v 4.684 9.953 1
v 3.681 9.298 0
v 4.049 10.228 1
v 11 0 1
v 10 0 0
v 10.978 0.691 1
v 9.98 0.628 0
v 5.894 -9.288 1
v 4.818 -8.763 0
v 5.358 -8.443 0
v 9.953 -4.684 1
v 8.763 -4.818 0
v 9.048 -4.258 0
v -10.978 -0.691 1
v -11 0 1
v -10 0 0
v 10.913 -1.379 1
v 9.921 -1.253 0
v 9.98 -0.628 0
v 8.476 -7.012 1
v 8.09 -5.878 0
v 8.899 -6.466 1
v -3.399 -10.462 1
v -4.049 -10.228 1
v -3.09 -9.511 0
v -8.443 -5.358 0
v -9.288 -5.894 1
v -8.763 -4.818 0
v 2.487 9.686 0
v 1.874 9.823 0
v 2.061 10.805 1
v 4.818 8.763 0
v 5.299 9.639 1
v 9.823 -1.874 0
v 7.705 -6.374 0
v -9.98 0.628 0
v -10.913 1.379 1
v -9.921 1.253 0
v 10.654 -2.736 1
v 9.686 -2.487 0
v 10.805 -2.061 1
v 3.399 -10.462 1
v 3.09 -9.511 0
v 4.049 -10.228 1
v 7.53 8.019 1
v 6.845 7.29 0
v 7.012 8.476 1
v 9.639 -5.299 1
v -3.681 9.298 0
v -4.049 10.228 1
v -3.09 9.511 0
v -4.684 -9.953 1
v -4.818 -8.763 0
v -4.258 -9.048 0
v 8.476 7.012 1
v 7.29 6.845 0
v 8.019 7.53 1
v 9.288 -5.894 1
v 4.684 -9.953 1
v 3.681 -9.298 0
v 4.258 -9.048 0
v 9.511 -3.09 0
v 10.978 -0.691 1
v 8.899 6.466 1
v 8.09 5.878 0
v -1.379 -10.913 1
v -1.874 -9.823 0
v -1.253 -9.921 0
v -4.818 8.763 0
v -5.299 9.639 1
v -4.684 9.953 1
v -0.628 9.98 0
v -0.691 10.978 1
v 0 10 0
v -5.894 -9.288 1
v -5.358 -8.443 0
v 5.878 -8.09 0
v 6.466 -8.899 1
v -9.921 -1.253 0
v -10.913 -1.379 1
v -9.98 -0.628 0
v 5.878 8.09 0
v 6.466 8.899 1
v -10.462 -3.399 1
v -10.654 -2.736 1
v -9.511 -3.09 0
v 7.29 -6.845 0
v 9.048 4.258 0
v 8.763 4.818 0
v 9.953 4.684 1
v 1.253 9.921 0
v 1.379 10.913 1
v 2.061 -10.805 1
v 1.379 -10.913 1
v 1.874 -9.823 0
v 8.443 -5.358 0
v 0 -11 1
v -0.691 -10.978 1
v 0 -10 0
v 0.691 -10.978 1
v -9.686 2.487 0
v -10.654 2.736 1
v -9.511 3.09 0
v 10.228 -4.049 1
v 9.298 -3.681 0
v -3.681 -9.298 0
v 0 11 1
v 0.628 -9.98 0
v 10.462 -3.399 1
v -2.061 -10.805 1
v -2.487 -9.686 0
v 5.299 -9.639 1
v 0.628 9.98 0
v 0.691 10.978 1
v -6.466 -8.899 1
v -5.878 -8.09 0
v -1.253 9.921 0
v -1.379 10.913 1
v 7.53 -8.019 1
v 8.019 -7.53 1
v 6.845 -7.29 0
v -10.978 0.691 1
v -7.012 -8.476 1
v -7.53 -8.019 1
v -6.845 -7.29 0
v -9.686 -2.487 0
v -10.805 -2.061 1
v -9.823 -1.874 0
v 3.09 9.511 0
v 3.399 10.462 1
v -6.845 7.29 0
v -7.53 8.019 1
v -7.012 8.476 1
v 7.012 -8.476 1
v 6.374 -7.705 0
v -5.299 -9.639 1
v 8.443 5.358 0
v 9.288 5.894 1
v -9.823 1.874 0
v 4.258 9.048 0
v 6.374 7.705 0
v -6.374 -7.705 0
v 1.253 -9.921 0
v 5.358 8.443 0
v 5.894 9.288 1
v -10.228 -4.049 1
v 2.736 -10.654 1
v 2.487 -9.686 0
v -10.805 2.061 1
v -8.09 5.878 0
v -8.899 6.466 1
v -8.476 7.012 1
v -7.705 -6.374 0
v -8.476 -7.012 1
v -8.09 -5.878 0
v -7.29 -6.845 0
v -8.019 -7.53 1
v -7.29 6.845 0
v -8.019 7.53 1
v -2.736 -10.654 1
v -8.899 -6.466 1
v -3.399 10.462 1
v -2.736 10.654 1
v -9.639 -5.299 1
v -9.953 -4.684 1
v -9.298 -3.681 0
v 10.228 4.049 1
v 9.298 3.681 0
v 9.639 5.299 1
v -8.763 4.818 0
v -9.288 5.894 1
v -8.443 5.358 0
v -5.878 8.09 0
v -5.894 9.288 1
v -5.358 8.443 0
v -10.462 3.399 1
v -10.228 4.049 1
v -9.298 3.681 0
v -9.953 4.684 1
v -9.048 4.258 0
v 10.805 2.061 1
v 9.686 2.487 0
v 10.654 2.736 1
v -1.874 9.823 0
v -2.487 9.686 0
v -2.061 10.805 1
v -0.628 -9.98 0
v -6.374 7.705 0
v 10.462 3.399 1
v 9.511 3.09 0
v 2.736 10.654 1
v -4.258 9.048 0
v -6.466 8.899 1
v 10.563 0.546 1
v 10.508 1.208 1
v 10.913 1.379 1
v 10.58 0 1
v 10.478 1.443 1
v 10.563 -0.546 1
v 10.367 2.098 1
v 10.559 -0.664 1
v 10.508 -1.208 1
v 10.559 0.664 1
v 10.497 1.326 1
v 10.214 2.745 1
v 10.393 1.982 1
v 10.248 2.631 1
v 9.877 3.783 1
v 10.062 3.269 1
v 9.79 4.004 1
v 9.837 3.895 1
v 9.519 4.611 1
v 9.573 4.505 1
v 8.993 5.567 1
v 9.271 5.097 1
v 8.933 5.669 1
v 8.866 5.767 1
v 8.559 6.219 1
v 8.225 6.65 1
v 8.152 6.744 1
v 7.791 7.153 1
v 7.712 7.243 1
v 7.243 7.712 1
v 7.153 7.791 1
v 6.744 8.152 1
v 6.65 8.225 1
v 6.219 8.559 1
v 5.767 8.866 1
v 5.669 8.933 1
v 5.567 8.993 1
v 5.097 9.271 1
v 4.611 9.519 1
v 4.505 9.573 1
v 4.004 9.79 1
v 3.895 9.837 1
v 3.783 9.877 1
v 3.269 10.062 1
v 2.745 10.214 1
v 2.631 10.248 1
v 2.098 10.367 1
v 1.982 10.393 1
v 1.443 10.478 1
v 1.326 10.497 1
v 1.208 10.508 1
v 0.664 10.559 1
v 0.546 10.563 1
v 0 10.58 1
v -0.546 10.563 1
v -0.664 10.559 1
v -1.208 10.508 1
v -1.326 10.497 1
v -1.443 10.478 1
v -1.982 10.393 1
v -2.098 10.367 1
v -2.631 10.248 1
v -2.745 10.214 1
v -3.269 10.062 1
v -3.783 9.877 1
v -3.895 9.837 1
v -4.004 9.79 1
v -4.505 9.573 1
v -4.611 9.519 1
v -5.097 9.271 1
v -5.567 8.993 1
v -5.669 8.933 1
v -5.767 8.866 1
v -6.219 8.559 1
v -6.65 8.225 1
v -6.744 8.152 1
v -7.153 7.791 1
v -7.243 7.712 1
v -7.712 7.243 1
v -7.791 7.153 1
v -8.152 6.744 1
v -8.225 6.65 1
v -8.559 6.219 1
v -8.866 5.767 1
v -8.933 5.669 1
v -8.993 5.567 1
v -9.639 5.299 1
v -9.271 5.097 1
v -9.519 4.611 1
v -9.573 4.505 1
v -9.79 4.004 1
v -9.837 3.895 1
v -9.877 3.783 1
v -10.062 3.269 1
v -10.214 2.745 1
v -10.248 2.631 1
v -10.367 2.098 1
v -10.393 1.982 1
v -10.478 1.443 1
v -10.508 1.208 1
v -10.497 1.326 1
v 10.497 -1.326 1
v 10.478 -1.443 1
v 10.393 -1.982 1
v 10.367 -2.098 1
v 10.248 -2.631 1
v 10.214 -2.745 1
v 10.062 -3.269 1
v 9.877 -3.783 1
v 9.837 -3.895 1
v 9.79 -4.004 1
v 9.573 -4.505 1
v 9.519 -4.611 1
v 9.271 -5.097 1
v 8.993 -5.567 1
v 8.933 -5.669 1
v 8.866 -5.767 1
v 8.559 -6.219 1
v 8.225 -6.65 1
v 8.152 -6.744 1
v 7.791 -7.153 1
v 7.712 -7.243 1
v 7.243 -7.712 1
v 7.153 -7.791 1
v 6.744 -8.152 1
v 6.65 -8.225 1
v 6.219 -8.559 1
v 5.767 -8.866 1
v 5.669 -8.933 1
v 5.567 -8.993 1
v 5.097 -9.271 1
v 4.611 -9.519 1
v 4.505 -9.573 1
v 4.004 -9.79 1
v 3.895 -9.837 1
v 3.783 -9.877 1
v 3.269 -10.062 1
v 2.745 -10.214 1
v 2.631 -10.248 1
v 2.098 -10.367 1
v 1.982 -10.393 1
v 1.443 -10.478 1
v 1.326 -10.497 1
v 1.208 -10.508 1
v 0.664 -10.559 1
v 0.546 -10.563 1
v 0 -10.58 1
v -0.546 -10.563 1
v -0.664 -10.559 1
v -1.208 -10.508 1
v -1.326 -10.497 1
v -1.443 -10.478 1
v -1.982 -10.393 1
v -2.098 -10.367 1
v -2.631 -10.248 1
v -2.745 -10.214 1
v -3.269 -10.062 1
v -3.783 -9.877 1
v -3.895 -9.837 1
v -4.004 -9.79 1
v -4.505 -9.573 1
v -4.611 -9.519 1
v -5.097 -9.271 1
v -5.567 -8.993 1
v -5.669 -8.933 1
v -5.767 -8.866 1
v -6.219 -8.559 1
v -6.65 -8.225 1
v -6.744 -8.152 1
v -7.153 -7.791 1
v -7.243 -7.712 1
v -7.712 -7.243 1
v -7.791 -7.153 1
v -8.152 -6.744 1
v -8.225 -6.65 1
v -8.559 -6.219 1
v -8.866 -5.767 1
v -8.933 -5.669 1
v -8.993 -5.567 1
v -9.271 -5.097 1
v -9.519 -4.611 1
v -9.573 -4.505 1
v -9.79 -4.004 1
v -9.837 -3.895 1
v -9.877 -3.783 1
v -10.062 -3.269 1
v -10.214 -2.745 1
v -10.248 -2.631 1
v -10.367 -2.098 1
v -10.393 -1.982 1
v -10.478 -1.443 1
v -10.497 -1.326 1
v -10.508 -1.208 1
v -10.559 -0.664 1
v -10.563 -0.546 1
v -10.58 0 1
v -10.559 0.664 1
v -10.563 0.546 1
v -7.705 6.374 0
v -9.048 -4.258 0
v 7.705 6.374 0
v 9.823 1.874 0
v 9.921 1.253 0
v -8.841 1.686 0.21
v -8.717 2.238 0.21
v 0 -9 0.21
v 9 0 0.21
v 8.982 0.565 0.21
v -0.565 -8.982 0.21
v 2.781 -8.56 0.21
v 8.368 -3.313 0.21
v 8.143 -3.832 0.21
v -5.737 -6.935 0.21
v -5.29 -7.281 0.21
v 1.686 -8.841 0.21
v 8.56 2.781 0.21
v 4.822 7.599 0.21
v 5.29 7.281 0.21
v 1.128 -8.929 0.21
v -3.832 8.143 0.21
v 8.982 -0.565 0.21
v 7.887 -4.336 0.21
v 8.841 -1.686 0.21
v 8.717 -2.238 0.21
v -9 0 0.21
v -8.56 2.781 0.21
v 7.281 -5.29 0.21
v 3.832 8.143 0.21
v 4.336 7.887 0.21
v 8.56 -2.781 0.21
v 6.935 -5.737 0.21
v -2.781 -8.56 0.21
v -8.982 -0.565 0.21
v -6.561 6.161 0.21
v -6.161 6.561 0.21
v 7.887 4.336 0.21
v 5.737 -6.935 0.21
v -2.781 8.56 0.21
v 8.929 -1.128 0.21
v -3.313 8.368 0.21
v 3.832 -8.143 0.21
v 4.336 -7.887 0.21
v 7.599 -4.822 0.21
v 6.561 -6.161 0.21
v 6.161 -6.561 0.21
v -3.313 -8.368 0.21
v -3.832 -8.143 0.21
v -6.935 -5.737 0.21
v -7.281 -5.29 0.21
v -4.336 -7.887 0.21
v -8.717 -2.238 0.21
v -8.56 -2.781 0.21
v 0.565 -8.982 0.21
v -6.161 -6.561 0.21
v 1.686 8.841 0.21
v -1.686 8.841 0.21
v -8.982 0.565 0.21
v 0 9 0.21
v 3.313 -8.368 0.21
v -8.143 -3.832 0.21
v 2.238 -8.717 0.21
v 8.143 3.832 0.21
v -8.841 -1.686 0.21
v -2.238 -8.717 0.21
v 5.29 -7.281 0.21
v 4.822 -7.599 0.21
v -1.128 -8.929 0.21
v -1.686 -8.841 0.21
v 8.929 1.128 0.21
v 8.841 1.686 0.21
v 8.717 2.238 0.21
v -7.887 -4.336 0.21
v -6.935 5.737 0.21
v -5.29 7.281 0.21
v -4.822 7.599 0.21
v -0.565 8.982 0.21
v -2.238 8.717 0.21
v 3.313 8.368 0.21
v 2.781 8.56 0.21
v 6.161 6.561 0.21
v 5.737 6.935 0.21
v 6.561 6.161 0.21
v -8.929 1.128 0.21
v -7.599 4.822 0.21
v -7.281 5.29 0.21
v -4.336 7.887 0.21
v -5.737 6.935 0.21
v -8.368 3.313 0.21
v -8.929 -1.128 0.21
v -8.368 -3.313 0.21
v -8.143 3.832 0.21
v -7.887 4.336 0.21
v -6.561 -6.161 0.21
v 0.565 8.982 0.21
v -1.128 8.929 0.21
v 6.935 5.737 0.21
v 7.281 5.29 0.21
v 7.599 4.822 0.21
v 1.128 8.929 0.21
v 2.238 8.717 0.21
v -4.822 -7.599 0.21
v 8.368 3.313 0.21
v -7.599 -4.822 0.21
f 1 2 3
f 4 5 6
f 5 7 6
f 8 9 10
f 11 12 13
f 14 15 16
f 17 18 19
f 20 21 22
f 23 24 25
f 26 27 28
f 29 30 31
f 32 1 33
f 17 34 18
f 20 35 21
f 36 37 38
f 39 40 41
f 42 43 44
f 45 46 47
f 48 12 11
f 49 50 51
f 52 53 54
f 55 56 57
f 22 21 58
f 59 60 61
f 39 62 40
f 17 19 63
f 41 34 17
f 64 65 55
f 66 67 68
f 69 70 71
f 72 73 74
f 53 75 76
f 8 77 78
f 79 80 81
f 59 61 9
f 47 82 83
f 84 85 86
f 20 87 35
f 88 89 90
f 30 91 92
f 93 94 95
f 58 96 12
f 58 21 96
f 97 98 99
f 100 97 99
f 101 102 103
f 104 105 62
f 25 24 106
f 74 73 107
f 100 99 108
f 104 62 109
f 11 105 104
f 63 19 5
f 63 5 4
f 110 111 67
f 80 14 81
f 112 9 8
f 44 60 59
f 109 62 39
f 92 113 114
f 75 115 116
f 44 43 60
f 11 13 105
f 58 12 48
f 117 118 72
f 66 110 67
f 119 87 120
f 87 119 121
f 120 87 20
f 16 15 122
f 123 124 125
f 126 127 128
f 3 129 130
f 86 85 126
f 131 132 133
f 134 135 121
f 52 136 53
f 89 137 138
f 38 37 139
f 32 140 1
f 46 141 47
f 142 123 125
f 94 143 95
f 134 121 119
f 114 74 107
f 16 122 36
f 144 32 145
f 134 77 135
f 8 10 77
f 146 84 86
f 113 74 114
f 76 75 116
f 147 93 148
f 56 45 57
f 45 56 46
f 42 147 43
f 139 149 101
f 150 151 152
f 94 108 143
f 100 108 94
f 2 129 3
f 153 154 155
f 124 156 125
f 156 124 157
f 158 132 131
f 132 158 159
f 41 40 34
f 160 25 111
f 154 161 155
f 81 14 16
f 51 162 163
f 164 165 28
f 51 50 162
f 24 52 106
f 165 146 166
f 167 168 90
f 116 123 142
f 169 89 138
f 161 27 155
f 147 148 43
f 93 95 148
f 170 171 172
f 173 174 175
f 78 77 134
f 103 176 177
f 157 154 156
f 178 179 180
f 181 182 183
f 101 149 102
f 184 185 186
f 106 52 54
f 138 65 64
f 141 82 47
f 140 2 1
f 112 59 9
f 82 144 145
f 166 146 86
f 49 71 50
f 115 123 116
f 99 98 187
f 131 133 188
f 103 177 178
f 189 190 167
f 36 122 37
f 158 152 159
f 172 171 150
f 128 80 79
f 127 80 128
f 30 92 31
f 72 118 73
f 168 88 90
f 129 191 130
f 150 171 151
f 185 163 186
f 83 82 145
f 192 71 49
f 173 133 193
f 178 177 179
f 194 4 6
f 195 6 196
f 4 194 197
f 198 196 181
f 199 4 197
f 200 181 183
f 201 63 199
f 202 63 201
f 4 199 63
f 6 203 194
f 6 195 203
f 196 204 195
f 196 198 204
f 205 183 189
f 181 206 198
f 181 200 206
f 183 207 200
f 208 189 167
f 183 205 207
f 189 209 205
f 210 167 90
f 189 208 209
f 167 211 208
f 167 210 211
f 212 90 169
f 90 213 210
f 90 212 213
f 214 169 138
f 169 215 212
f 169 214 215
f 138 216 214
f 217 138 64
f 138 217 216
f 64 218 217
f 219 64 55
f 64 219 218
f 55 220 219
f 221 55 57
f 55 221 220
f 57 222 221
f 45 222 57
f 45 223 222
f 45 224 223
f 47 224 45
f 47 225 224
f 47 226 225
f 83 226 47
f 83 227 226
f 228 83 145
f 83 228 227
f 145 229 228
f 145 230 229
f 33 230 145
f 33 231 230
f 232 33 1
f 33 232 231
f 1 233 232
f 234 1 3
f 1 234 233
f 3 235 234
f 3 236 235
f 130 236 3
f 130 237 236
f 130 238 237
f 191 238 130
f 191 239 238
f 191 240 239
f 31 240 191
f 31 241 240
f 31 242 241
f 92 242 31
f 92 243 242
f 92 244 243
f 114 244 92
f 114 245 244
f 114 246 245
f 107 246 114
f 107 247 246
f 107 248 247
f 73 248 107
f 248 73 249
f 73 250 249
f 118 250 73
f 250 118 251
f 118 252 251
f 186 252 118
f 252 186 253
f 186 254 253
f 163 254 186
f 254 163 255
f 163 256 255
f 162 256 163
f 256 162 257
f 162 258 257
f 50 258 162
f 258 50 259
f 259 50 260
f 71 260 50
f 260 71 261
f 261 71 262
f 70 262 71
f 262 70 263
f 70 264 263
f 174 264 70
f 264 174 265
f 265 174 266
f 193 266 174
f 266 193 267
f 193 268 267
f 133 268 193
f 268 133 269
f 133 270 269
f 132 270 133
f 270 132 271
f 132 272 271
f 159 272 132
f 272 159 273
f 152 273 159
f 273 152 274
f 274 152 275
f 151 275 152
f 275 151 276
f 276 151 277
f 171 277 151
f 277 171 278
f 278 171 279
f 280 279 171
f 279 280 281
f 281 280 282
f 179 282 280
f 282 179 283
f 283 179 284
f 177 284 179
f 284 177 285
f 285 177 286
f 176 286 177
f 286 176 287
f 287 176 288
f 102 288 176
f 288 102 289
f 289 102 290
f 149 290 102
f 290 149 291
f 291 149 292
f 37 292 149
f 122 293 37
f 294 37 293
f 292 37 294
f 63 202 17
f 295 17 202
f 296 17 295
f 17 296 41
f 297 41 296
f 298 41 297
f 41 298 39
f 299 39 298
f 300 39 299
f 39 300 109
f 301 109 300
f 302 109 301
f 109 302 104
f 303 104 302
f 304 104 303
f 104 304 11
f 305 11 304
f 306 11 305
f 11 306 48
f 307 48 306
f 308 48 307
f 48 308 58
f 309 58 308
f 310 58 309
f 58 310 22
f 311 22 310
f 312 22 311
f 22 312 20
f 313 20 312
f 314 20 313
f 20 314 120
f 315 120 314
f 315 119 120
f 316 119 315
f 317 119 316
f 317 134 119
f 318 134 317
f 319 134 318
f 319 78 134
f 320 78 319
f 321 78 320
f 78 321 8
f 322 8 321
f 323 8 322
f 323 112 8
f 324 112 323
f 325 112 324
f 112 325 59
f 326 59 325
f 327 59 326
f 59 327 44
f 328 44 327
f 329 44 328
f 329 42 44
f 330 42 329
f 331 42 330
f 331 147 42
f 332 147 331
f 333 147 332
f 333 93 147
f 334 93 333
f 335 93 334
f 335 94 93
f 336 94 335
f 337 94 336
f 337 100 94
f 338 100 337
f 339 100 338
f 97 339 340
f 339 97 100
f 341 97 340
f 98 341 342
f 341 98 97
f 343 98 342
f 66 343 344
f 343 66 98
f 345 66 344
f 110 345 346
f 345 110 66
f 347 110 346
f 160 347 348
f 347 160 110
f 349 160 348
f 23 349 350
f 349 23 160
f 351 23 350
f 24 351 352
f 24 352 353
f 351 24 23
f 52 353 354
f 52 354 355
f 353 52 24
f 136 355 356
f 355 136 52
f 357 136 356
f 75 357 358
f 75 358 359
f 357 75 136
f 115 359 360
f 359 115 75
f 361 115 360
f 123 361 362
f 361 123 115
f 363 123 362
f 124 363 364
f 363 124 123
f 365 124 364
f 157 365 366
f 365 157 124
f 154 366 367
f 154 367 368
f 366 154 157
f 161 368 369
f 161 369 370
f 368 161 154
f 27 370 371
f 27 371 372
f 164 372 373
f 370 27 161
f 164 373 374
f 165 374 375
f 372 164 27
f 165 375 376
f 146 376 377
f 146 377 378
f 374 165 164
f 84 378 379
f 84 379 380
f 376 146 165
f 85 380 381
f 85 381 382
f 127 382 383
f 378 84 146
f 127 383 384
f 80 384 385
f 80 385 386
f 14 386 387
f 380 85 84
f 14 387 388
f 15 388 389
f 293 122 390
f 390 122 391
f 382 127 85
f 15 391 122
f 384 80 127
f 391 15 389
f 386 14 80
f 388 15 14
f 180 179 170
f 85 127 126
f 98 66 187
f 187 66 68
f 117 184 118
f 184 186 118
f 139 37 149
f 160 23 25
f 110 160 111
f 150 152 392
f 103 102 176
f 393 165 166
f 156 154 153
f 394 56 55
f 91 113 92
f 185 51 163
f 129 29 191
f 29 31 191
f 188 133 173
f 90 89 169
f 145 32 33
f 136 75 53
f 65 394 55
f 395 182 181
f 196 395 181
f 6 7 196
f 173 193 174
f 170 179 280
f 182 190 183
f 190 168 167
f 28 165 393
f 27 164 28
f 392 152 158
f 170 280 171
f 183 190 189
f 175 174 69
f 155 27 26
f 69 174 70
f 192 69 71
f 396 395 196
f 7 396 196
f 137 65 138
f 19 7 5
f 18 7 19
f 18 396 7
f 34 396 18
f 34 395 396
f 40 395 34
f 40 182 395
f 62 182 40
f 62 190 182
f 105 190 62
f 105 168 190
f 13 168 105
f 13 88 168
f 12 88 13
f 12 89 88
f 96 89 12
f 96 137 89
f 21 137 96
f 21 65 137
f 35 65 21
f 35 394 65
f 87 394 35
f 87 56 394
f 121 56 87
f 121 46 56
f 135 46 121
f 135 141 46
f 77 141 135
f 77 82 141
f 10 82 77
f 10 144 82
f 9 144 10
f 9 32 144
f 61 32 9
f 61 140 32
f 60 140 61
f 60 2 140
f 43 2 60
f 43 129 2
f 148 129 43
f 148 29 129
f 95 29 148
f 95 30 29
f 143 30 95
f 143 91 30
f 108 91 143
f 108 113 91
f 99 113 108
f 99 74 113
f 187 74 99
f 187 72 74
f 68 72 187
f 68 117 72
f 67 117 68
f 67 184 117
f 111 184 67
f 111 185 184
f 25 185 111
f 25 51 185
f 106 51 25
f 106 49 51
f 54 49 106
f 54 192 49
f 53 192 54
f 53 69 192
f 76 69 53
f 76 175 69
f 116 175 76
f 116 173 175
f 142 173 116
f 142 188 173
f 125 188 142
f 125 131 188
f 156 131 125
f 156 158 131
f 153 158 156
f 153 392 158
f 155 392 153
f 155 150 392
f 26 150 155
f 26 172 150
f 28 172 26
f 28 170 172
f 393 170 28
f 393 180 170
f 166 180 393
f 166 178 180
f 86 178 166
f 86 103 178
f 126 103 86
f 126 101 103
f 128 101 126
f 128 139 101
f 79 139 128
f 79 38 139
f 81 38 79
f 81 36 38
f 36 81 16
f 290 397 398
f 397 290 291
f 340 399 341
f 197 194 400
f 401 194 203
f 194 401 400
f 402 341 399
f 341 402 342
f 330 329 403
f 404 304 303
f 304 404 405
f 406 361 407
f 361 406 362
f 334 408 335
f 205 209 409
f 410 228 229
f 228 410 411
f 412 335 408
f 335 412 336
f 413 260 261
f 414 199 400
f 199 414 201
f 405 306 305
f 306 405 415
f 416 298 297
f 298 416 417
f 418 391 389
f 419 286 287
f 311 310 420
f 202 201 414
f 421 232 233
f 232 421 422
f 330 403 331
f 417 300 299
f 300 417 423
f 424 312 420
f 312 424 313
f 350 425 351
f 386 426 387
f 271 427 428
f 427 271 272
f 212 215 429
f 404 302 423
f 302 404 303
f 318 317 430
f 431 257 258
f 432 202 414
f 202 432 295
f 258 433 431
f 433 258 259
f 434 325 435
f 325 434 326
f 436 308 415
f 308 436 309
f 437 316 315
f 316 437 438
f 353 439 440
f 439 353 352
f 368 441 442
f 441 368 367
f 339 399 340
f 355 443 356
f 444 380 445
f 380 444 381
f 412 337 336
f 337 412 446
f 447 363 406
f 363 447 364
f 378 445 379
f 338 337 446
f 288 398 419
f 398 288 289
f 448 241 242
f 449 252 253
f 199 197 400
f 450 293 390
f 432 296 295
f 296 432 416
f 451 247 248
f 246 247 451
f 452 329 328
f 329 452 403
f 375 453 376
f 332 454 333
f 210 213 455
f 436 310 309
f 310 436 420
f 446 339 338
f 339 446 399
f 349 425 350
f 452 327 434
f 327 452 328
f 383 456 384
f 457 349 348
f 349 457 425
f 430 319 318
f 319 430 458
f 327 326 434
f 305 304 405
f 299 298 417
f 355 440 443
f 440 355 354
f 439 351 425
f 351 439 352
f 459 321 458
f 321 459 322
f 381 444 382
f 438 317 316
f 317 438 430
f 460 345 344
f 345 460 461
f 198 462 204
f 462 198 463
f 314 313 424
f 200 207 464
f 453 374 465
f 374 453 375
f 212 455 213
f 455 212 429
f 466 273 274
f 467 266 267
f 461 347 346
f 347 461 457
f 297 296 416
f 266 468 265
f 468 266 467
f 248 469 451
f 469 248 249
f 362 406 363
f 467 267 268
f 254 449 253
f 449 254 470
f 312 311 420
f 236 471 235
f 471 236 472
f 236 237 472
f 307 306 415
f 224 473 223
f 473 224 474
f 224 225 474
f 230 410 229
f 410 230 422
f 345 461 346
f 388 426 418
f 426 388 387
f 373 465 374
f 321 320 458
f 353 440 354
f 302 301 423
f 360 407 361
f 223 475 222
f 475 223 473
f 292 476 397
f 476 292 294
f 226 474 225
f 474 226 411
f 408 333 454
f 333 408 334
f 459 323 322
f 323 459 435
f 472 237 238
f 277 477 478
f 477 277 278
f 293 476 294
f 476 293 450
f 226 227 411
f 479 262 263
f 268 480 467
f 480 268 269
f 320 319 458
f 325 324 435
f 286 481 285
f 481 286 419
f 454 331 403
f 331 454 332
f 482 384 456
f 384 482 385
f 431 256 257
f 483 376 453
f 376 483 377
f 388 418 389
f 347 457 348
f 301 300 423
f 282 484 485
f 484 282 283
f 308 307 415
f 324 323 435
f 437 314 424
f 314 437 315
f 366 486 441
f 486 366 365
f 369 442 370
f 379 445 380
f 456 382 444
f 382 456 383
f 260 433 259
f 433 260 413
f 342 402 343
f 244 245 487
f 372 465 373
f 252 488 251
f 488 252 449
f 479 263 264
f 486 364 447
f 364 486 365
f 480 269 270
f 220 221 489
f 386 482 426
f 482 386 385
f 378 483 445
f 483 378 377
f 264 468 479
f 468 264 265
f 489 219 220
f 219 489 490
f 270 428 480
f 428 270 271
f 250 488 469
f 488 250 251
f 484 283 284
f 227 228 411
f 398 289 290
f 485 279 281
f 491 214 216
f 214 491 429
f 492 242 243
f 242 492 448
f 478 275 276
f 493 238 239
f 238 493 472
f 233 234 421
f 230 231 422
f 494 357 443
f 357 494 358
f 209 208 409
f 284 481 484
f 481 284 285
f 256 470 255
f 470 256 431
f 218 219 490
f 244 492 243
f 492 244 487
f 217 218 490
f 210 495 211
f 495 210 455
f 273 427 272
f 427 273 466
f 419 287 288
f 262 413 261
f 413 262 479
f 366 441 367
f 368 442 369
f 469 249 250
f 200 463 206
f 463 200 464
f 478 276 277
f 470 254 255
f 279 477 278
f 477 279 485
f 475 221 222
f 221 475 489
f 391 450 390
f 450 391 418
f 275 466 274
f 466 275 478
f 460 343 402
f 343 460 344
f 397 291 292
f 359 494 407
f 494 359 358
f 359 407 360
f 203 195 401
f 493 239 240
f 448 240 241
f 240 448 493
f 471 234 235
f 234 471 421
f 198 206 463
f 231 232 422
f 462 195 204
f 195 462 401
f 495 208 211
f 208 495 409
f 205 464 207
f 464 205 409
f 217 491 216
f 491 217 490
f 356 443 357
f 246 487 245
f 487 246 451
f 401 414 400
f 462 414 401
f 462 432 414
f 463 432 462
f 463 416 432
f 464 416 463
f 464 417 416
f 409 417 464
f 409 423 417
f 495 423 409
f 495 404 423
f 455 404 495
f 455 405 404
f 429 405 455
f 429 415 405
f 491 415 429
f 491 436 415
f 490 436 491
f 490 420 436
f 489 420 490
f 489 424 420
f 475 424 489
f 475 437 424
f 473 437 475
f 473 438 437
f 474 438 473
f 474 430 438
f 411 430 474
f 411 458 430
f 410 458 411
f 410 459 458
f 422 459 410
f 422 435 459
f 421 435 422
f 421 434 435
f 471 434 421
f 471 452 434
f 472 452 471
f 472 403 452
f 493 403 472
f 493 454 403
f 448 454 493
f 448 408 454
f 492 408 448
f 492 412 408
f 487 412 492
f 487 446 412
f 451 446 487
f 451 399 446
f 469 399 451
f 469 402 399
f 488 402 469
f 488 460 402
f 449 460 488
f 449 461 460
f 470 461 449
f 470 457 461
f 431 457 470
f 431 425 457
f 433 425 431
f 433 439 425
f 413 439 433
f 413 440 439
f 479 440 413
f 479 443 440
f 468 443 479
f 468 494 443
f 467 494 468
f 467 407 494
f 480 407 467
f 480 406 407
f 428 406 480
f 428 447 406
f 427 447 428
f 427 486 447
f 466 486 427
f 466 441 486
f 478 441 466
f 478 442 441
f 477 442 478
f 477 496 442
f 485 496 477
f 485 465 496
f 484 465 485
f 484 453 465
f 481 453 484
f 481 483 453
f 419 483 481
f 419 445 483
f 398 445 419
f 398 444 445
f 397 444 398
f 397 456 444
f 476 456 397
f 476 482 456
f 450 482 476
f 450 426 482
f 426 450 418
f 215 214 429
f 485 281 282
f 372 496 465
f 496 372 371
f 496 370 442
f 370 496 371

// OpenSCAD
$fn =100;

difference(){
	cylinder(h = 1, r1 =10,r2=11);  
	translate([0, 0, 0.21]) cylinder(h=1,r1=9,r2=11);
}
